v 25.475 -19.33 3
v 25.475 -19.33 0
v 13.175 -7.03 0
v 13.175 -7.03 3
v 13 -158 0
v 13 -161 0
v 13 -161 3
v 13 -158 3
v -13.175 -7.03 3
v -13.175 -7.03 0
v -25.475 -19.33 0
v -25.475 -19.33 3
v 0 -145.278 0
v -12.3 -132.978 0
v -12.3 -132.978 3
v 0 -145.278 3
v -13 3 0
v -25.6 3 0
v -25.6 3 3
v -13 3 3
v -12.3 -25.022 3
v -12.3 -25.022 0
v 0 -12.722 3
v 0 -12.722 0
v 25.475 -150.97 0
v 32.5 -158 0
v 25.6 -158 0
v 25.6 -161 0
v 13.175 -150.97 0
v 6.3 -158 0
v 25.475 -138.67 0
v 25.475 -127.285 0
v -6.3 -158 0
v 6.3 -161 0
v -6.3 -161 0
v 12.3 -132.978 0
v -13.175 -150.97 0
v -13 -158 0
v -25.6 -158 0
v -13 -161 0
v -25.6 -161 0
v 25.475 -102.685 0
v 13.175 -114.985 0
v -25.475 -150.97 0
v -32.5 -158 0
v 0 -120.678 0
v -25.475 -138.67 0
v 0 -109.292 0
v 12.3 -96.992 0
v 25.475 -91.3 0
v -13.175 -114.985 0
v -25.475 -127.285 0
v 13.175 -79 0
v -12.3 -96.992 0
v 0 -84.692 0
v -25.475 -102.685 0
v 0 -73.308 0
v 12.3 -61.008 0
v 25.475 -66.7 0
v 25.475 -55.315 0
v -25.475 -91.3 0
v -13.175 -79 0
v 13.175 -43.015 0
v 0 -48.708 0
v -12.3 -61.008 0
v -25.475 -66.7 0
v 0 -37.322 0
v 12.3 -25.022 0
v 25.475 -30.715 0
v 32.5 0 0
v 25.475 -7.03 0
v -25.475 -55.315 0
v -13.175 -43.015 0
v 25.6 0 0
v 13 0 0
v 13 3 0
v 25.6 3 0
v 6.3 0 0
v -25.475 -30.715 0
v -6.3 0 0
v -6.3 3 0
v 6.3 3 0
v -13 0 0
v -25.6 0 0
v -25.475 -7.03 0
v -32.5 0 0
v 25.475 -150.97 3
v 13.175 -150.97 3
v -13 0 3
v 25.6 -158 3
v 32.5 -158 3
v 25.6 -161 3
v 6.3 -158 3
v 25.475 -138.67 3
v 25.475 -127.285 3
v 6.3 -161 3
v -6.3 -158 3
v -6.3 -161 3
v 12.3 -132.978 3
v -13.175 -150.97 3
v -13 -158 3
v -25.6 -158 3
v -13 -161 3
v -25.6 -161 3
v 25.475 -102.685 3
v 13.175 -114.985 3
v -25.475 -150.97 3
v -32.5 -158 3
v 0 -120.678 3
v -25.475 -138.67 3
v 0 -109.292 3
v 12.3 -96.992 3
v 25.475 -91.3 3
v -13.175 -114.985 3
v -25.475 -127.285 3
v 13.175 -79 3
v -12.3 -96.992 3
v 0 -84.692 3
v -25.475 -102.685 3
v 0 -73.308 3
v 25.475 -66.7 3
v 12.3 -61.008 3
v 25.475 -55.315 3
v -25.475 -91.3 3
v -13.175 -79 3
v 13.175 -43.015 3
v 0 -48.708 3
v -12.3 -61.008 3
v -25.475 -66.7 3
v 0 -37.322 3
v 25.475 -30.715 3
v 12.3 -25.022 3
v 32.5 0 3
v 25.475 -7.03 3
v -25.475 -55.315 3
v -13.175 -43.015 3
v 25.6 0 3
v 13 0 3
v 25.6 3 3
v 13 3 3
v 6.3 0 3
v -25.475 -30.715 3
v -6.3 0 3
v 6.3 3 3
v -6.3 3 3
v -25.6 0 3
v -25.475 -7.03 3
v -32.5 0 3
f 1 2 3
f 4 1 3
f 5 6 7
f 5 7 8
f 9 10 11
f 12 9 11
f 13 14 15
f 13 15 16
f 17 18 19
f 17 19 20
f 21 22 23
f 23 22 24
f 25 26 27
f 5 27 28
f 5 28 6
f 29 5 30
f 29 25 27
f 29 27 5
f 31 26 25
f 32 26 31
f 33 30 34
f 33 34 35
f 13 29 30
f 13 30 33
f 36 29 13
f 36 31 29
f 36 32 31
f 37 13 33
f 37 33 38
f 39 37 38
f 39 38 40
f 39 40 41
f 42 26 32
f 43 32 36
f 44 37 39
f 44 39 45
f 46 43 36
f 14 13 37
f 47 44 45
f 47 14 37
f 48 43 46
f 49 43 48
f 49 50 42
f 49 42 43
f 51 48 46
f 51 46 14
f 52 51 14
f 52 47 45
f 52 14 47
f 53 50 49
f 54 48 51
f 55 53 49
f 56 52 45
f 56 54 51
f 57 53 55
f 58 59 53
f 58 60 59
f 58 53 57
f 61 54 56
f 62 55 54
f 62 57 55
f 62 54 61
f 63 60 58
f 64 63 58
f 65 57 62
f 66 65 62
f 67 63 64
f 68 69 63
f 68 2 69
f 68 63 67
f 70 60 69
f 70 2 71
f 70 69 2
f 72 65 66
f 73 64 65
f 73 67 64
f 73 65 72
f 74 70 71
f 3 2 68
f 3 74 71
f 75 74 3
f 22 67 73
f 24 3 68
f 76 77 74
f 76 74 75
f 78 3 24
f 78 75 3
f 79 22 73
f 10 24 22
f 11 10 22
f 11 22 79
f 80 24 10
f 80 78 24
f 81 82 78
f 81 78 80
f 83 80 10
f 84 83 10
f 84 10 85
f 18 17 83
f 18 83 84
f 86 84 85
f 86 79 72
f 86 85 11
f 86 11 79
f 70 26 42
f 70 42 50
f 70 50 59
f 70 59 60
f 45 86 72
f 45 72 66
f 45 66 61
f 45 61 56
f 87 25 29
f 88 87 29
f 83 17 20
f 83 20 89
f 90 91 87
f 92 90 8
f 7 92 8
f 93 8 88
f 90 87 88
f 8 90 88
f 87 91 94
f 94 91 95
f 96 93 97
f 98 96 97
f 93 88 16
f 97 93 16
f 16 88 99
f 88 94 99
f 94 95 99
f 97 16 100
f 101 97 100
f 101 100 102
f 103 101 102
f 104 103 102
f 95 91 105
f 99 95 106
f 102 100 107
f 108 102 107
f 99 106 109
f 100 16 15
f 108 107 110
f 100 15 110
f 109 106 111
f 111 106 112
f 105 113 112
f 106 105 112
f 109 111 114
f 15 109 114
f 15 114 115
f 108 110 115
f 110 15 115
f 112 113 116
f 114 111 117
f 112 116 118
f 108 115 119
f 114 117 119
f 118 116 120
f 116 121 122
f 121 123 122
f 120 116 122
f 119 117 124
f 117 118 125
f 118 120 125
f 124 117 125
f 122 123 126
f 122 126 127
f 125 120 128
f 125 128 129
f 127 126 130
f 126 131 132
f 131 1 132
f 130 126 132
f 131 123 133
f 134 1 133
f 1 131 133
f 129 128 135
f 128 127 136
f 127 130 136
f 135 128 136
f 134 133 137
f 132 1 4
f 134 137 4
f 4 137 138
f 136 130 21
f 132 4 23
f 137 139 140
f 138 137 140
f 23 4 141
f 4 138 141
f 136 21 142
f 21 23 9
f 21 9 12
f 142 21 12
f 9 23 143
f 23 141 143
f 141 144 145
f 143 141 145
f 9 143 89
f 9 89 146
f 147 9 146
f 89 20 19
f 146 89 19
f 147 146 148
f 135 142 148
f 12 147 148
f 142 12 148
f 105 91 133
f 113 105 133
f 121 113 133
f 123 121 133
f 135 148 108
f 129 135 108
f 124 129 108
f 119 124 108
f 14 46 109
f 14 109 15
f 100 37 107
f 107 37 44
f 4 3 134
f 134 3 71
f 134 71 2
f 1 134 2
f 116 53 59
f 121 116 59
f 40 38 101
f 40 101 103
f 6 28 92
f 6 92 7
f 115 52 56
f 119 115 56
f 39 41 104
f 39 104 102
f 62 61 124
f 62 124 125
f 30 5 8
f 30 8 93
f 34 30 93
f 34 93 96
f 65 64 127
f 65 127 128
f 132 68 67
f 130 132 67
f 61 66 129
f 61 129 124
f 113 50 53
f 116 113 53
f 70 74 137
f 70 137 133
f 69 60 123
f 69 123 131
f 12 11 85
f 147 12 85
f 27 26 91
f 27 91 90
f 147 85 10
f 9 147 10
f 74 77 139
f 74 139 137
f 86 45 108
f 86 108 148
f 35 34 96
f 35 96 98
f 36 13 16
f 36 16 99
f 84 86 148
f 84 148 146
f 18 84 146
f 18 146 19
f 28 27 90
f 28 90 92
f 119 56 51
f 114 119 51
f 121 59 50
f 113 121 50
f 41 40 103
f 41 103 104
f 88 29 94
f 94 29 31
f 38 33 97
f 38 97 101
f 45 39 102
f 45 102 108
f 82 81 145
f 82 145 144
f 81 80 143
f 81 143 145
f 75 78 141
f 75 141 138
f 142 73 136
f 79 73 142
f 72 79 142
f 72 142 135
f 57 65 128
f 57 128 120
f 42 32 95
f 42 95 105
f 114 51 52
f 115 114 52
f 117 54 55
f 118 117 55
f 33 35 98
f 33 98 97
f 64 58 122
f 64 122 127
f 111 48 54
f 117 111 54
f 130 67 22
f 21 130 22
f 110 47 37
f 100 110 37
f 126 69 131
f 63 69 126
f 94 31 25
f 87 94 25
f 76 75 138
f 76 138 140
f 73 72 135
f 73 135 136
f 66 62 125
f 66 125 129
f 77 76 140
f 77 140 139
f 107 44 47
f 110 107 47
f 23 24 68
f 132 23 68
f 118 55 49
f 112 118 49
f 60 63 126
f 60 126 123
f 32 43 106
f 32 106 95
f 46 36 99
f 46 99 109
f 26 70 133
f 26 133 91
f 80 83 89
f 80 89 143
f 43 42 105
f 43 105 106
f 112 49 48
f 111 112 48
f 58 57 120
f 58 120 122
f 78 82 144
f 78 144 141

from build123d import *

# Parameters (mm, degrees)
SALIENTE_EXTRUIR1_DEPTH = 3


with BuildPart() as part:
    # Croquis2 → Saliente-Extruir1 (new body)
    with BuildSketch(Plane.XY):
        Polygon((-32.5, 0), (-25.6, 0), (-25.6, 3), (-13, 3), (-13, 0), (-6.3, 0), (-6.3, 3), (6.3, 3), (6.3, 0), (13, 0), (13, 3), (25.6, 3), (25.6, 0), (32.5, 0), (32.5, -158), (25.6, -158), (25.6, -161), (13, -161), (13, -158), (6.3, -158), (6.3, -161), (-6.3, -161), (-6.3, -158), (-13, -158), (-13, -161), (-25.6, -161), (-25.6, -158), (-32.5, -158), align=None)
        Polygon((-13.175, -7.03), (-25.475, -19.33), (-25.475, -7.03), align=None, mode=Mode.SUBTRACT)
        Polygon((13.175, -7.03), (25.475, -7.03), (25.475, -19.33), align=None, mode=Mode.SUBTRACT)
        Polygon((13.175, -79), (25.475, -66.7), (25.475, -91.3), align=None, mode=Mode.SUBTRACT)
        Polygon((13.175, -150.97), (25.475, -138.67), (25.475, -150.97), align=None, mode=Mode.SUBTRACT)
        Polygon((-13.175, -79), (-25.475, -66.7), (-25.475, -91.3), align=None, mode=Mode.SUBTRACT)
        Polygon((13.175, -43.015), (25.475, -55.315), (25.475, -30.715), align=None, mode=Mode.SUBTRACT)
        Polygon((-13.175, -43.015), (-25.475, -30.715), (-25.475, -55.315), align=None, mode=Mode.SUBTRACT)
        Polygon((0, -48.7075), (-12.3, -61.0075), (0, -73.3075), (12.3, -61.0075), align=None, mode=Mode.SUBTRACT)
        Polygon((0, -12.7225), (12.3, -25.0225), (0, -37.3225), (-12.3, -25.0225), align=None, mode=Mode.SUBTRACT)
        Polygon((-13.175, -150.97), (-25.475, -150.97), (-25.475, -138.67), align=None, mode=Mode.SUBTRACT)
        Polygon((-13.175, -114.985), (-25.475, -127.285), (-25.475, -102.685), align=None, mode=Mode.SUBTRACT)
        Polygon((-12.3, -132.9775), (0, -145.2775), (12.3, -132.9775), (0, -120.6775), align=None, mode=Mode.SUBTRACT)
        Polygon((13.175, -114.985), (25.475, -127.285), (25.475, -102.685), align=None, mode=Mode.SUBTRACT)
        Polygon((0, -84.6925), (12.3, -96.9925), (0, -109.2925), (-12.3, -96.9925), align=None, mode=Mode.SUBTRACT)
    extrude(amount=SALIENTE_EXTRUIR1_DEPTH)


solid = part.part
